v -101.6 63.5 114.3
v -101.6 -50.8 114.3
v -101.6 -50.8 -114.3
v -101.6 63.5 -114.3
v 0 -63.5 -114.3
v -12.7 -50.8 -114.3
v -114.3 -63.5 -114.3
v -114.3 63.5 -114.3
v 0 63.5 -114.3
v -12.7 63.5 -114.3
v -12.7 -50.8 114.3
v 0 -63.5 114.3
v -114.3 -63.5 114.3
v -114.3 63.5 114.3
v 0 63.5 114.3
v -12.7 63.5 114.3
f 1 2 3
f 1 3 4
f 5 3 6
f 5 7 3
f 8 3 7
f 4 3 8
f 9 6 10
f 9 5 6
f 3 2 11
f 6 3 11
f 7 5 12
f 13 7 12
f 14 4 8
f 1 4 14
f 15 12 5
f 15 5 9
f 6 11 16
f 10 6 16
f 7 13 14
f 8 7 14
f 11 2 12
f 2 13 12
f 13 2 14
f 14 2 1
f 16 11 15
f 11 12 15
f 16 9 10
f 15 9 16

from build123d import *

# Parameters (mm, degrees)
F0_W     = 127
F0_H     = 228.6
F1_DEPTH = 12.7
F4_W     = 127
F4_H     = 228.6
F5_DEPTH = 12.7
F6_W     = 98.14891
F6_H     = 228.6
F7_DEPTH = 12.7


with BuildPart() as f1:
    # F0 (on Right) → F1 (new body)
    with BuildSketch(Plane.YZ):
        Rectangle(F0_W, F0_H)
    extrude(amount=-F1_DEPTH)



with BuildPart() as f5:
    # F4 (on offset) → F5 (new body)
    with BuildSketch(Plane.YZ.offset(-101.6)):
        Rectangle(F4_W, F4_H)
    extrude(amount=-F5_DEPTH)


with BuildPart() as f1_1:
    add(f1.part)

    add(f5.part)  # F7 merges F5
    # F6 (on offset) → F7 (join)
    with BuildSketch(Plane.XZ.offset(50.8)):
        with Locations((-57.461153, 0)):
            Rectangle(F6_W, F6_H)
    extrude(amount=F7_DEPTH)


solid = f1_1.part
